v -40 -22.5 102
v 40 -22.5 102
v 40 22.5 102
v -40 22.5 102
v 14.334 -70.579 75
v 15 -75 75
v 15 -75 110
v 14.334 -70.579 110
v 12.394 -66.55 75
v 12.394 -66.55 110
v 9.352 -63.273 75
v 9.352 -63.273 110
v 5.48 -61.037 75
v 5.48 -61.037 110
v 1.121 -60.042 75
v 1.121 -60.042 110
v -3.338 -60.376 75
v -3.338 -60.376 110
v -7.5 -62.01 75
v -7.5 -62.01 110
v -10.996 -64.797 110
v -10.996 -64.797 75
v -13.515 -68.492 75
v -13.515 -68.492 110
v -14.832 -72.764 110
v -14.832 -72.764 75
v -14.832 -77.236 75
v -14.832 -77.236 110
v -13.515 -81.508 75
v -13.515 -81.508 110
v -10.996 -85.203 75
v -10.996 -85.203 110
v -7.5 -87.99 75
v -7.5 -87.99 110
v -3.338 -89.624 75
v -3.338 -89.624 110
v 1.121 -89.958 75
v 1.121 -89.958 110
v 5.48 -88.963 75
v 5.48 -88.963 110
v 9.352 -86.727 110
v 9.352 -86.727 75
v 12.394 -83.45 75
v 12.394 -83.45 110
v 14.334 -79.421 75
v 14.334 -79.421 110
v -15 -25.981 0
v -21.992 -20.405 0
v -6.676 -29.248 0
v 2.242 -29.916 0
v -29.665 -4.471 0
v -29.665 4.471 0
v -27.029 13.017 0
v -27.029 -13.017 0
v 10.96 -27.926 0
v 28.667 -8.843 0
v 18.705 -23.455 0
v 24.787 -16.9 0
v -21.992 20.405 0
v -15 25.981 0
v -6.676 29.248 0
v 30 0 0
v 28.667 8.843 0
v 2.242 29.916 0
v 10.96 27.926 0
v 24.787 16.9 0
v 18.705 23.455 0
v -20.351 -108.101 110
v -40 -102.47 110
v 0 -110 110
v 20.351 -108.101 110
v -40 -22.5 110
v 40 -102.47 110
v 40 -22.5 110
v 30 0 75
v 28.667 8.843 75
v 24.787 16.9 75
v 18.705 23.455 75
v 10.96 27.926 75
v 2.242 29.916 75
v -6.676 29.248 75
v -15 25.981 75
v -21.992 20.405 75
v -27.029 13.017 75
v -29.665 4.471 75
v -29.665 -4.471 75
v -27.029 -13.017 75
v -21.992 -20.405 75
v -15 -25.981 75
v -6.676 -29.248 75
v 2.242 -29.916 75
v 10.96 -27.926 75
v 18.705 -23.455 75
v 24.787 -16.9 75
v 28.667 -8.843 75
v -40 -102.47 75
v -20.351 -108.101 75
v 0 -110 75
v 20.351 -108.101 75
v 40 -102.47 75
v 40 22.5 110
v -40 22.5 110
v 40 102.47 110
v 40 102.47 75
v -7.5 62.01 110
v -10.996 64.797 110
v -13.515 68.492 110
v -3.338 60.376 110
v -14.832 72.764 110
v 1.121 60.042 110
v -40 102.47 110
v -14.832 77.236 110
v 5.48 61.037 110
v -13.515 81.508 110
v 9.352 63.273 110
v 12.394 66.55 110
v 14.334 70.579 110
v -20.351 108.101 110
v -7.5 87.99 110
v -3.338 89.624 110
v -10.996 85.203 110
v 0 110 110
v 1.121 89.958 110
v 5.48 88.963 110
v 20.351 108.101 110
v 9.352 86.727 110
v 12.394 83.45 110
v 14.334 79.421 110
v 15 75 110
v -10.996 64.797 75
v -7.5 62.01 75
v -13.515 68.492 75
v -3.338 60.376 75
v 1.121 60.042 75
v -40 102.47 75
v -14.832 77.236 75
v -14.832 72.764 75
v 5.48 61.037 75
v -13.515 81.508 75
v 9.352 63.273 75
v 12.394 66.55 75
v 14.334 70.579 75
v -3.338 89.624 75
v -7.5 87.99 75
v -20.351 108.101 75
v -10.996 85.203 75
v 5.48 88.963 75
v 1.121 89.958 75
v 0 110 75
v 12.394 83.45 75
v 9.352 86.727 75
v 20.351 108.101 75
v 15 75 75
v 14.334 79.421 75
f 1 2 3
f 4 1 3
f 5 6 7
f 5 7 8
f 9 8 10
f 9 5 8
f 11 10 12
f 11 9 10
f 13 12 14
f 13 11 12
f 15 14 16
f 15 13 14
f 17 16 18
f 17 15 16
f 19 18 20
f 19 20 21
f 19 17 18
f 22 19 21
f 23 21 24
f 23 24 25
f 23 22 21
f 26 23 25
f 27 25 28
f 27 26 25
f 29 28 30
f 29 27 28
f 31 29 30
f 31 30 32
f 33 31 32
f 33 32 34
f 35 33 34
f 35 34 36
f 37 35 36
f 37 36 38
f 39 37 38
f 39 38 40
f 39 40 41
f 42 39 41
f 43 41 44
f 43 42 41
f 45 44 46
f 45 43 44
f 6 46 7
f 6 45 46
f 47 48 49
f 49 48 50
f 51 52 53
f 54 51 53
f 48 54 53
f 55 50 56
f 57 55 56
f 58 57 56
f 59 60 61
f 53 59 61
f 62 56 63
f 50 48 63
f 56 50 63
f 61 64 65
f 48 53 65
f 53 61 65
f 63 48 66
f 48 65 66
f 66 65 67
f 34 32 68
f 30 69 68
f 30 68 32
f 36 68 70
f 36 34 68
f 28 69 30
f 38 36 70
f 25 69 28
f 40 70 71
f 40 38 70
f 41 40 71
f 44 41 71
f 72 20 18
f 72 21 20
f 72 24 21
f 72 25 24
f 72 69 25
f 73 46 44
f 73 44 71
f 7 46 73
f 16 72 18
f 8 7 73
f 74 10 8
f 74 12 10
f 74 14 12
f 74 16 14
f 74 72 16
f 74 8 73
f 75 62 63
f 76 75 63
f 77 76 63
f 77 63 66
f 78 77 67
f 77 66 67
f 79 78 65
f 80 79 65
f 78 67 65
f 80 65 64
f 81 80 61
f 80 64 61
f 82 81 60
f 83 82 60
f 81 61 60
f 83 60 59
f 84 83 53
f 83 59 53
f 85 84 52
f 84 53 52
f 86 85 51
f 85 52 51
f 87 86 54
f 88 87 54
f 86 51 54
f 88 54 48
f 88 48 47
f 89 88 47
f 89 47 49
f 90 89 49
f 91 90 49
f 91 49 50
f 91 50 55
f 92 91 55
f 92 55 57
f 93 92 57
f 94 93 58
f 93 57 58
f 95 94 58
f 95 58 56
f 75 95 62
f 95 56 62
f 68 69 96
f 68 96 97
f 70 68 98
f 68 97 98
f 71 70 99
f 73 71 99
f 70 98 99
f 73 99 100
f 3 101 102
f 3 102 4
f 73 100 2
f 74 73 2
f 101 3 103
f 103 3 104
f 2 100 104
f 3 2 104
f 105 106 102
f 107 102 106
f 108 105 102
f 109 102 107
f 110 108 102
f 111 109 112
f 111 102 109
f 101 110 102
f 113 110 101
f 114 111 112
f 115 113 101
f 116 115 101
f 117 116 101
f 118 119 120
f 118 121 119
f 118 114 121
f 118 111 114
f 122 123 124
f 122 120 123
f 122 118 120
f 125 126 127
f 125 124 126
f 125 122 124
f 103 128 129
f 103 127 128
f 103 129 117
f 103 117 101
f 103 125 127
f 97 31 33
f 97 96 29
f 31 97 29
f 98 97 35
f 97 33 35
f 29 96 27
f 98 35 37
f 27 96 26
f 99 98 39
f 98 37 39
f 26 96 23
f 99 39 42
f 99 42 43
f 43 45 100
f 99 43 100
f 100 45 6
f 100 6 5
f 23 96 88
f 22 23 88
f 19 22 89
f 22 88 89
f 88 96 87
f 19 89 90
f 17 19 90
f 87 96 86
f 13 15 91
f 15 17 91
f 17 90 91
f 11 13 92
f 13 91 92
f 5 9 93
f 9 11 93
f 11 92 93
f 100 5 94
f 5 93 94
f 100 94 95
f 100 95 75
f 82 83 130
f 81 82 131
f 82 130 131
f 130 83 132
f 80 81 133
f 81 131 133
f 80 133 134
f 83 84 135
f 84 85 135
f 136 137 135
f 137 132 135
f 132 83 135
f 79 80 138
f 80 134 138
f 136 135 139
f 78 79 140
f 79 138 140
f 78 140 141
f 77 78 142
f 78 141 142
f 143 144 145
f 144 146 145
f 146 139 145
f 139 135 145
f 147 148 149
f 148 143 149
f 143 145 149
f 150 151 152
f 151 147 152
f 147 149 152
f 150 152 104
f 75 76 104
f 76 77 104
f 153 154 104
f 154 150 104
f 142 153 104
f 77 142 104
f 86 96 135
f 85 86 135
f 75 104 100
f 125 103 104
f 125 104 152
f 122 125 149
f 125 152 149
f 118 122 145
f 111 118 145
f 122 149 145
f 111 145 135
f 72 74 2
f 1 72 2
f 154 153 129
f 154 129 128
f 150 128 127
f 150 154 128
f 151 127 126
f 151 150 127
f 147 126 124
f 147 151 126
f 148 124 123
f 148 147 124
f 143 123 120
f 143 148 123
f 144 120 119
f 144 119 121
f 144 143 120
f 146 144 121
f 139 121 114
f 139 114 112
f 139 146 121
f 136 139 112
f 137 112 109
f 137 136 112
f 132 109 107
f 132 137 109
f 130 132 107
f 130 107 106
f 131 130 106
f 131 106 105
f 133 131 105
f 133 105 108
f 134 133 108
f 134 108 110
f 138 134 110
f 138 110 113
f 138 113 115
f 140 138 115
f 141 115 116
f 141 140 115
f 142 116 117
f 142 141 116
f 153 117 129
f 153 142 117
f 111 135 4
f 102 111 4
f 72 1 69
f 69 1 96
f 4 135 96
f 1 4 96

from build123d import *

# Parameters (mm, degrees)
SKETCH1_R           = 30
BOSS_EXTRUDE1_DEPTH = 75
SKETCH2_R           = 15
BOSS_EXTRUDE2_DEPTH = 35
CUT_EXTRUDE1_REACH  = 82
SKETCH3_W           = 8
SKETCH3_H           = 45


with BuildPart() as part:
    # Sketch1 → Boss-Extrude1 (new body)
    with BuildSketch(Plane.XY):
        Circle(SKETCH1_R)
    extrude(amount=BOSS_EXTRUDE1_DEPTH)

    # Sketch2 → Boss-Extrude2 (add)
    with BuildSketch(Plane.XY.offset(75)):
        with BuildLine():
            Line((-40, 102.46950766), (-40, -102.46950766))
            ThreePointArc((-40, -102.46950766), (0, -110), (40, -102.46950766))
            Line((40, -102.46950766), (40, 102.46950766))
            ThreePointArc((40, 102.46950766), (0, 110), (-40, 102.46950766))
        make_face()
        with Locations((0, -75)):
            Circle(SKETCH2_R, mode=Mode.SUBTRACT)
        with Locations((0, 75)):
            Circle(SKETCH2_R, mode=Mode.SUBTRACT)
    extrude(amount=BOSS_EXTRUDE2_DEPTH)

    # Sketch3 → Cut-Extrude1 (cut, up to next)
    with BuildSketch(Plane(origin=(40, 0, 0), x_dir=(0, 0, -1), z_dir=(1, 0, 0)), mode=Mode.PRIVATE) as cut_extrude1_sk1:
        with Locations((-106, 0)):
            Rectangle(SKETCH3_W, SKETCH3_H)
    cut_extrude1_tool1 = extrude(cut_extrude1_sk1.sketch, amount=-CUT_EXTRUDE1_REACH, mode=Mode.PRIVATE) & part.part
    add(cut_extrude1_tool1.solids().sort_by_distance((40, 0, 106))[0], mode=Mode.SUBTRACT)


solid = part.part
